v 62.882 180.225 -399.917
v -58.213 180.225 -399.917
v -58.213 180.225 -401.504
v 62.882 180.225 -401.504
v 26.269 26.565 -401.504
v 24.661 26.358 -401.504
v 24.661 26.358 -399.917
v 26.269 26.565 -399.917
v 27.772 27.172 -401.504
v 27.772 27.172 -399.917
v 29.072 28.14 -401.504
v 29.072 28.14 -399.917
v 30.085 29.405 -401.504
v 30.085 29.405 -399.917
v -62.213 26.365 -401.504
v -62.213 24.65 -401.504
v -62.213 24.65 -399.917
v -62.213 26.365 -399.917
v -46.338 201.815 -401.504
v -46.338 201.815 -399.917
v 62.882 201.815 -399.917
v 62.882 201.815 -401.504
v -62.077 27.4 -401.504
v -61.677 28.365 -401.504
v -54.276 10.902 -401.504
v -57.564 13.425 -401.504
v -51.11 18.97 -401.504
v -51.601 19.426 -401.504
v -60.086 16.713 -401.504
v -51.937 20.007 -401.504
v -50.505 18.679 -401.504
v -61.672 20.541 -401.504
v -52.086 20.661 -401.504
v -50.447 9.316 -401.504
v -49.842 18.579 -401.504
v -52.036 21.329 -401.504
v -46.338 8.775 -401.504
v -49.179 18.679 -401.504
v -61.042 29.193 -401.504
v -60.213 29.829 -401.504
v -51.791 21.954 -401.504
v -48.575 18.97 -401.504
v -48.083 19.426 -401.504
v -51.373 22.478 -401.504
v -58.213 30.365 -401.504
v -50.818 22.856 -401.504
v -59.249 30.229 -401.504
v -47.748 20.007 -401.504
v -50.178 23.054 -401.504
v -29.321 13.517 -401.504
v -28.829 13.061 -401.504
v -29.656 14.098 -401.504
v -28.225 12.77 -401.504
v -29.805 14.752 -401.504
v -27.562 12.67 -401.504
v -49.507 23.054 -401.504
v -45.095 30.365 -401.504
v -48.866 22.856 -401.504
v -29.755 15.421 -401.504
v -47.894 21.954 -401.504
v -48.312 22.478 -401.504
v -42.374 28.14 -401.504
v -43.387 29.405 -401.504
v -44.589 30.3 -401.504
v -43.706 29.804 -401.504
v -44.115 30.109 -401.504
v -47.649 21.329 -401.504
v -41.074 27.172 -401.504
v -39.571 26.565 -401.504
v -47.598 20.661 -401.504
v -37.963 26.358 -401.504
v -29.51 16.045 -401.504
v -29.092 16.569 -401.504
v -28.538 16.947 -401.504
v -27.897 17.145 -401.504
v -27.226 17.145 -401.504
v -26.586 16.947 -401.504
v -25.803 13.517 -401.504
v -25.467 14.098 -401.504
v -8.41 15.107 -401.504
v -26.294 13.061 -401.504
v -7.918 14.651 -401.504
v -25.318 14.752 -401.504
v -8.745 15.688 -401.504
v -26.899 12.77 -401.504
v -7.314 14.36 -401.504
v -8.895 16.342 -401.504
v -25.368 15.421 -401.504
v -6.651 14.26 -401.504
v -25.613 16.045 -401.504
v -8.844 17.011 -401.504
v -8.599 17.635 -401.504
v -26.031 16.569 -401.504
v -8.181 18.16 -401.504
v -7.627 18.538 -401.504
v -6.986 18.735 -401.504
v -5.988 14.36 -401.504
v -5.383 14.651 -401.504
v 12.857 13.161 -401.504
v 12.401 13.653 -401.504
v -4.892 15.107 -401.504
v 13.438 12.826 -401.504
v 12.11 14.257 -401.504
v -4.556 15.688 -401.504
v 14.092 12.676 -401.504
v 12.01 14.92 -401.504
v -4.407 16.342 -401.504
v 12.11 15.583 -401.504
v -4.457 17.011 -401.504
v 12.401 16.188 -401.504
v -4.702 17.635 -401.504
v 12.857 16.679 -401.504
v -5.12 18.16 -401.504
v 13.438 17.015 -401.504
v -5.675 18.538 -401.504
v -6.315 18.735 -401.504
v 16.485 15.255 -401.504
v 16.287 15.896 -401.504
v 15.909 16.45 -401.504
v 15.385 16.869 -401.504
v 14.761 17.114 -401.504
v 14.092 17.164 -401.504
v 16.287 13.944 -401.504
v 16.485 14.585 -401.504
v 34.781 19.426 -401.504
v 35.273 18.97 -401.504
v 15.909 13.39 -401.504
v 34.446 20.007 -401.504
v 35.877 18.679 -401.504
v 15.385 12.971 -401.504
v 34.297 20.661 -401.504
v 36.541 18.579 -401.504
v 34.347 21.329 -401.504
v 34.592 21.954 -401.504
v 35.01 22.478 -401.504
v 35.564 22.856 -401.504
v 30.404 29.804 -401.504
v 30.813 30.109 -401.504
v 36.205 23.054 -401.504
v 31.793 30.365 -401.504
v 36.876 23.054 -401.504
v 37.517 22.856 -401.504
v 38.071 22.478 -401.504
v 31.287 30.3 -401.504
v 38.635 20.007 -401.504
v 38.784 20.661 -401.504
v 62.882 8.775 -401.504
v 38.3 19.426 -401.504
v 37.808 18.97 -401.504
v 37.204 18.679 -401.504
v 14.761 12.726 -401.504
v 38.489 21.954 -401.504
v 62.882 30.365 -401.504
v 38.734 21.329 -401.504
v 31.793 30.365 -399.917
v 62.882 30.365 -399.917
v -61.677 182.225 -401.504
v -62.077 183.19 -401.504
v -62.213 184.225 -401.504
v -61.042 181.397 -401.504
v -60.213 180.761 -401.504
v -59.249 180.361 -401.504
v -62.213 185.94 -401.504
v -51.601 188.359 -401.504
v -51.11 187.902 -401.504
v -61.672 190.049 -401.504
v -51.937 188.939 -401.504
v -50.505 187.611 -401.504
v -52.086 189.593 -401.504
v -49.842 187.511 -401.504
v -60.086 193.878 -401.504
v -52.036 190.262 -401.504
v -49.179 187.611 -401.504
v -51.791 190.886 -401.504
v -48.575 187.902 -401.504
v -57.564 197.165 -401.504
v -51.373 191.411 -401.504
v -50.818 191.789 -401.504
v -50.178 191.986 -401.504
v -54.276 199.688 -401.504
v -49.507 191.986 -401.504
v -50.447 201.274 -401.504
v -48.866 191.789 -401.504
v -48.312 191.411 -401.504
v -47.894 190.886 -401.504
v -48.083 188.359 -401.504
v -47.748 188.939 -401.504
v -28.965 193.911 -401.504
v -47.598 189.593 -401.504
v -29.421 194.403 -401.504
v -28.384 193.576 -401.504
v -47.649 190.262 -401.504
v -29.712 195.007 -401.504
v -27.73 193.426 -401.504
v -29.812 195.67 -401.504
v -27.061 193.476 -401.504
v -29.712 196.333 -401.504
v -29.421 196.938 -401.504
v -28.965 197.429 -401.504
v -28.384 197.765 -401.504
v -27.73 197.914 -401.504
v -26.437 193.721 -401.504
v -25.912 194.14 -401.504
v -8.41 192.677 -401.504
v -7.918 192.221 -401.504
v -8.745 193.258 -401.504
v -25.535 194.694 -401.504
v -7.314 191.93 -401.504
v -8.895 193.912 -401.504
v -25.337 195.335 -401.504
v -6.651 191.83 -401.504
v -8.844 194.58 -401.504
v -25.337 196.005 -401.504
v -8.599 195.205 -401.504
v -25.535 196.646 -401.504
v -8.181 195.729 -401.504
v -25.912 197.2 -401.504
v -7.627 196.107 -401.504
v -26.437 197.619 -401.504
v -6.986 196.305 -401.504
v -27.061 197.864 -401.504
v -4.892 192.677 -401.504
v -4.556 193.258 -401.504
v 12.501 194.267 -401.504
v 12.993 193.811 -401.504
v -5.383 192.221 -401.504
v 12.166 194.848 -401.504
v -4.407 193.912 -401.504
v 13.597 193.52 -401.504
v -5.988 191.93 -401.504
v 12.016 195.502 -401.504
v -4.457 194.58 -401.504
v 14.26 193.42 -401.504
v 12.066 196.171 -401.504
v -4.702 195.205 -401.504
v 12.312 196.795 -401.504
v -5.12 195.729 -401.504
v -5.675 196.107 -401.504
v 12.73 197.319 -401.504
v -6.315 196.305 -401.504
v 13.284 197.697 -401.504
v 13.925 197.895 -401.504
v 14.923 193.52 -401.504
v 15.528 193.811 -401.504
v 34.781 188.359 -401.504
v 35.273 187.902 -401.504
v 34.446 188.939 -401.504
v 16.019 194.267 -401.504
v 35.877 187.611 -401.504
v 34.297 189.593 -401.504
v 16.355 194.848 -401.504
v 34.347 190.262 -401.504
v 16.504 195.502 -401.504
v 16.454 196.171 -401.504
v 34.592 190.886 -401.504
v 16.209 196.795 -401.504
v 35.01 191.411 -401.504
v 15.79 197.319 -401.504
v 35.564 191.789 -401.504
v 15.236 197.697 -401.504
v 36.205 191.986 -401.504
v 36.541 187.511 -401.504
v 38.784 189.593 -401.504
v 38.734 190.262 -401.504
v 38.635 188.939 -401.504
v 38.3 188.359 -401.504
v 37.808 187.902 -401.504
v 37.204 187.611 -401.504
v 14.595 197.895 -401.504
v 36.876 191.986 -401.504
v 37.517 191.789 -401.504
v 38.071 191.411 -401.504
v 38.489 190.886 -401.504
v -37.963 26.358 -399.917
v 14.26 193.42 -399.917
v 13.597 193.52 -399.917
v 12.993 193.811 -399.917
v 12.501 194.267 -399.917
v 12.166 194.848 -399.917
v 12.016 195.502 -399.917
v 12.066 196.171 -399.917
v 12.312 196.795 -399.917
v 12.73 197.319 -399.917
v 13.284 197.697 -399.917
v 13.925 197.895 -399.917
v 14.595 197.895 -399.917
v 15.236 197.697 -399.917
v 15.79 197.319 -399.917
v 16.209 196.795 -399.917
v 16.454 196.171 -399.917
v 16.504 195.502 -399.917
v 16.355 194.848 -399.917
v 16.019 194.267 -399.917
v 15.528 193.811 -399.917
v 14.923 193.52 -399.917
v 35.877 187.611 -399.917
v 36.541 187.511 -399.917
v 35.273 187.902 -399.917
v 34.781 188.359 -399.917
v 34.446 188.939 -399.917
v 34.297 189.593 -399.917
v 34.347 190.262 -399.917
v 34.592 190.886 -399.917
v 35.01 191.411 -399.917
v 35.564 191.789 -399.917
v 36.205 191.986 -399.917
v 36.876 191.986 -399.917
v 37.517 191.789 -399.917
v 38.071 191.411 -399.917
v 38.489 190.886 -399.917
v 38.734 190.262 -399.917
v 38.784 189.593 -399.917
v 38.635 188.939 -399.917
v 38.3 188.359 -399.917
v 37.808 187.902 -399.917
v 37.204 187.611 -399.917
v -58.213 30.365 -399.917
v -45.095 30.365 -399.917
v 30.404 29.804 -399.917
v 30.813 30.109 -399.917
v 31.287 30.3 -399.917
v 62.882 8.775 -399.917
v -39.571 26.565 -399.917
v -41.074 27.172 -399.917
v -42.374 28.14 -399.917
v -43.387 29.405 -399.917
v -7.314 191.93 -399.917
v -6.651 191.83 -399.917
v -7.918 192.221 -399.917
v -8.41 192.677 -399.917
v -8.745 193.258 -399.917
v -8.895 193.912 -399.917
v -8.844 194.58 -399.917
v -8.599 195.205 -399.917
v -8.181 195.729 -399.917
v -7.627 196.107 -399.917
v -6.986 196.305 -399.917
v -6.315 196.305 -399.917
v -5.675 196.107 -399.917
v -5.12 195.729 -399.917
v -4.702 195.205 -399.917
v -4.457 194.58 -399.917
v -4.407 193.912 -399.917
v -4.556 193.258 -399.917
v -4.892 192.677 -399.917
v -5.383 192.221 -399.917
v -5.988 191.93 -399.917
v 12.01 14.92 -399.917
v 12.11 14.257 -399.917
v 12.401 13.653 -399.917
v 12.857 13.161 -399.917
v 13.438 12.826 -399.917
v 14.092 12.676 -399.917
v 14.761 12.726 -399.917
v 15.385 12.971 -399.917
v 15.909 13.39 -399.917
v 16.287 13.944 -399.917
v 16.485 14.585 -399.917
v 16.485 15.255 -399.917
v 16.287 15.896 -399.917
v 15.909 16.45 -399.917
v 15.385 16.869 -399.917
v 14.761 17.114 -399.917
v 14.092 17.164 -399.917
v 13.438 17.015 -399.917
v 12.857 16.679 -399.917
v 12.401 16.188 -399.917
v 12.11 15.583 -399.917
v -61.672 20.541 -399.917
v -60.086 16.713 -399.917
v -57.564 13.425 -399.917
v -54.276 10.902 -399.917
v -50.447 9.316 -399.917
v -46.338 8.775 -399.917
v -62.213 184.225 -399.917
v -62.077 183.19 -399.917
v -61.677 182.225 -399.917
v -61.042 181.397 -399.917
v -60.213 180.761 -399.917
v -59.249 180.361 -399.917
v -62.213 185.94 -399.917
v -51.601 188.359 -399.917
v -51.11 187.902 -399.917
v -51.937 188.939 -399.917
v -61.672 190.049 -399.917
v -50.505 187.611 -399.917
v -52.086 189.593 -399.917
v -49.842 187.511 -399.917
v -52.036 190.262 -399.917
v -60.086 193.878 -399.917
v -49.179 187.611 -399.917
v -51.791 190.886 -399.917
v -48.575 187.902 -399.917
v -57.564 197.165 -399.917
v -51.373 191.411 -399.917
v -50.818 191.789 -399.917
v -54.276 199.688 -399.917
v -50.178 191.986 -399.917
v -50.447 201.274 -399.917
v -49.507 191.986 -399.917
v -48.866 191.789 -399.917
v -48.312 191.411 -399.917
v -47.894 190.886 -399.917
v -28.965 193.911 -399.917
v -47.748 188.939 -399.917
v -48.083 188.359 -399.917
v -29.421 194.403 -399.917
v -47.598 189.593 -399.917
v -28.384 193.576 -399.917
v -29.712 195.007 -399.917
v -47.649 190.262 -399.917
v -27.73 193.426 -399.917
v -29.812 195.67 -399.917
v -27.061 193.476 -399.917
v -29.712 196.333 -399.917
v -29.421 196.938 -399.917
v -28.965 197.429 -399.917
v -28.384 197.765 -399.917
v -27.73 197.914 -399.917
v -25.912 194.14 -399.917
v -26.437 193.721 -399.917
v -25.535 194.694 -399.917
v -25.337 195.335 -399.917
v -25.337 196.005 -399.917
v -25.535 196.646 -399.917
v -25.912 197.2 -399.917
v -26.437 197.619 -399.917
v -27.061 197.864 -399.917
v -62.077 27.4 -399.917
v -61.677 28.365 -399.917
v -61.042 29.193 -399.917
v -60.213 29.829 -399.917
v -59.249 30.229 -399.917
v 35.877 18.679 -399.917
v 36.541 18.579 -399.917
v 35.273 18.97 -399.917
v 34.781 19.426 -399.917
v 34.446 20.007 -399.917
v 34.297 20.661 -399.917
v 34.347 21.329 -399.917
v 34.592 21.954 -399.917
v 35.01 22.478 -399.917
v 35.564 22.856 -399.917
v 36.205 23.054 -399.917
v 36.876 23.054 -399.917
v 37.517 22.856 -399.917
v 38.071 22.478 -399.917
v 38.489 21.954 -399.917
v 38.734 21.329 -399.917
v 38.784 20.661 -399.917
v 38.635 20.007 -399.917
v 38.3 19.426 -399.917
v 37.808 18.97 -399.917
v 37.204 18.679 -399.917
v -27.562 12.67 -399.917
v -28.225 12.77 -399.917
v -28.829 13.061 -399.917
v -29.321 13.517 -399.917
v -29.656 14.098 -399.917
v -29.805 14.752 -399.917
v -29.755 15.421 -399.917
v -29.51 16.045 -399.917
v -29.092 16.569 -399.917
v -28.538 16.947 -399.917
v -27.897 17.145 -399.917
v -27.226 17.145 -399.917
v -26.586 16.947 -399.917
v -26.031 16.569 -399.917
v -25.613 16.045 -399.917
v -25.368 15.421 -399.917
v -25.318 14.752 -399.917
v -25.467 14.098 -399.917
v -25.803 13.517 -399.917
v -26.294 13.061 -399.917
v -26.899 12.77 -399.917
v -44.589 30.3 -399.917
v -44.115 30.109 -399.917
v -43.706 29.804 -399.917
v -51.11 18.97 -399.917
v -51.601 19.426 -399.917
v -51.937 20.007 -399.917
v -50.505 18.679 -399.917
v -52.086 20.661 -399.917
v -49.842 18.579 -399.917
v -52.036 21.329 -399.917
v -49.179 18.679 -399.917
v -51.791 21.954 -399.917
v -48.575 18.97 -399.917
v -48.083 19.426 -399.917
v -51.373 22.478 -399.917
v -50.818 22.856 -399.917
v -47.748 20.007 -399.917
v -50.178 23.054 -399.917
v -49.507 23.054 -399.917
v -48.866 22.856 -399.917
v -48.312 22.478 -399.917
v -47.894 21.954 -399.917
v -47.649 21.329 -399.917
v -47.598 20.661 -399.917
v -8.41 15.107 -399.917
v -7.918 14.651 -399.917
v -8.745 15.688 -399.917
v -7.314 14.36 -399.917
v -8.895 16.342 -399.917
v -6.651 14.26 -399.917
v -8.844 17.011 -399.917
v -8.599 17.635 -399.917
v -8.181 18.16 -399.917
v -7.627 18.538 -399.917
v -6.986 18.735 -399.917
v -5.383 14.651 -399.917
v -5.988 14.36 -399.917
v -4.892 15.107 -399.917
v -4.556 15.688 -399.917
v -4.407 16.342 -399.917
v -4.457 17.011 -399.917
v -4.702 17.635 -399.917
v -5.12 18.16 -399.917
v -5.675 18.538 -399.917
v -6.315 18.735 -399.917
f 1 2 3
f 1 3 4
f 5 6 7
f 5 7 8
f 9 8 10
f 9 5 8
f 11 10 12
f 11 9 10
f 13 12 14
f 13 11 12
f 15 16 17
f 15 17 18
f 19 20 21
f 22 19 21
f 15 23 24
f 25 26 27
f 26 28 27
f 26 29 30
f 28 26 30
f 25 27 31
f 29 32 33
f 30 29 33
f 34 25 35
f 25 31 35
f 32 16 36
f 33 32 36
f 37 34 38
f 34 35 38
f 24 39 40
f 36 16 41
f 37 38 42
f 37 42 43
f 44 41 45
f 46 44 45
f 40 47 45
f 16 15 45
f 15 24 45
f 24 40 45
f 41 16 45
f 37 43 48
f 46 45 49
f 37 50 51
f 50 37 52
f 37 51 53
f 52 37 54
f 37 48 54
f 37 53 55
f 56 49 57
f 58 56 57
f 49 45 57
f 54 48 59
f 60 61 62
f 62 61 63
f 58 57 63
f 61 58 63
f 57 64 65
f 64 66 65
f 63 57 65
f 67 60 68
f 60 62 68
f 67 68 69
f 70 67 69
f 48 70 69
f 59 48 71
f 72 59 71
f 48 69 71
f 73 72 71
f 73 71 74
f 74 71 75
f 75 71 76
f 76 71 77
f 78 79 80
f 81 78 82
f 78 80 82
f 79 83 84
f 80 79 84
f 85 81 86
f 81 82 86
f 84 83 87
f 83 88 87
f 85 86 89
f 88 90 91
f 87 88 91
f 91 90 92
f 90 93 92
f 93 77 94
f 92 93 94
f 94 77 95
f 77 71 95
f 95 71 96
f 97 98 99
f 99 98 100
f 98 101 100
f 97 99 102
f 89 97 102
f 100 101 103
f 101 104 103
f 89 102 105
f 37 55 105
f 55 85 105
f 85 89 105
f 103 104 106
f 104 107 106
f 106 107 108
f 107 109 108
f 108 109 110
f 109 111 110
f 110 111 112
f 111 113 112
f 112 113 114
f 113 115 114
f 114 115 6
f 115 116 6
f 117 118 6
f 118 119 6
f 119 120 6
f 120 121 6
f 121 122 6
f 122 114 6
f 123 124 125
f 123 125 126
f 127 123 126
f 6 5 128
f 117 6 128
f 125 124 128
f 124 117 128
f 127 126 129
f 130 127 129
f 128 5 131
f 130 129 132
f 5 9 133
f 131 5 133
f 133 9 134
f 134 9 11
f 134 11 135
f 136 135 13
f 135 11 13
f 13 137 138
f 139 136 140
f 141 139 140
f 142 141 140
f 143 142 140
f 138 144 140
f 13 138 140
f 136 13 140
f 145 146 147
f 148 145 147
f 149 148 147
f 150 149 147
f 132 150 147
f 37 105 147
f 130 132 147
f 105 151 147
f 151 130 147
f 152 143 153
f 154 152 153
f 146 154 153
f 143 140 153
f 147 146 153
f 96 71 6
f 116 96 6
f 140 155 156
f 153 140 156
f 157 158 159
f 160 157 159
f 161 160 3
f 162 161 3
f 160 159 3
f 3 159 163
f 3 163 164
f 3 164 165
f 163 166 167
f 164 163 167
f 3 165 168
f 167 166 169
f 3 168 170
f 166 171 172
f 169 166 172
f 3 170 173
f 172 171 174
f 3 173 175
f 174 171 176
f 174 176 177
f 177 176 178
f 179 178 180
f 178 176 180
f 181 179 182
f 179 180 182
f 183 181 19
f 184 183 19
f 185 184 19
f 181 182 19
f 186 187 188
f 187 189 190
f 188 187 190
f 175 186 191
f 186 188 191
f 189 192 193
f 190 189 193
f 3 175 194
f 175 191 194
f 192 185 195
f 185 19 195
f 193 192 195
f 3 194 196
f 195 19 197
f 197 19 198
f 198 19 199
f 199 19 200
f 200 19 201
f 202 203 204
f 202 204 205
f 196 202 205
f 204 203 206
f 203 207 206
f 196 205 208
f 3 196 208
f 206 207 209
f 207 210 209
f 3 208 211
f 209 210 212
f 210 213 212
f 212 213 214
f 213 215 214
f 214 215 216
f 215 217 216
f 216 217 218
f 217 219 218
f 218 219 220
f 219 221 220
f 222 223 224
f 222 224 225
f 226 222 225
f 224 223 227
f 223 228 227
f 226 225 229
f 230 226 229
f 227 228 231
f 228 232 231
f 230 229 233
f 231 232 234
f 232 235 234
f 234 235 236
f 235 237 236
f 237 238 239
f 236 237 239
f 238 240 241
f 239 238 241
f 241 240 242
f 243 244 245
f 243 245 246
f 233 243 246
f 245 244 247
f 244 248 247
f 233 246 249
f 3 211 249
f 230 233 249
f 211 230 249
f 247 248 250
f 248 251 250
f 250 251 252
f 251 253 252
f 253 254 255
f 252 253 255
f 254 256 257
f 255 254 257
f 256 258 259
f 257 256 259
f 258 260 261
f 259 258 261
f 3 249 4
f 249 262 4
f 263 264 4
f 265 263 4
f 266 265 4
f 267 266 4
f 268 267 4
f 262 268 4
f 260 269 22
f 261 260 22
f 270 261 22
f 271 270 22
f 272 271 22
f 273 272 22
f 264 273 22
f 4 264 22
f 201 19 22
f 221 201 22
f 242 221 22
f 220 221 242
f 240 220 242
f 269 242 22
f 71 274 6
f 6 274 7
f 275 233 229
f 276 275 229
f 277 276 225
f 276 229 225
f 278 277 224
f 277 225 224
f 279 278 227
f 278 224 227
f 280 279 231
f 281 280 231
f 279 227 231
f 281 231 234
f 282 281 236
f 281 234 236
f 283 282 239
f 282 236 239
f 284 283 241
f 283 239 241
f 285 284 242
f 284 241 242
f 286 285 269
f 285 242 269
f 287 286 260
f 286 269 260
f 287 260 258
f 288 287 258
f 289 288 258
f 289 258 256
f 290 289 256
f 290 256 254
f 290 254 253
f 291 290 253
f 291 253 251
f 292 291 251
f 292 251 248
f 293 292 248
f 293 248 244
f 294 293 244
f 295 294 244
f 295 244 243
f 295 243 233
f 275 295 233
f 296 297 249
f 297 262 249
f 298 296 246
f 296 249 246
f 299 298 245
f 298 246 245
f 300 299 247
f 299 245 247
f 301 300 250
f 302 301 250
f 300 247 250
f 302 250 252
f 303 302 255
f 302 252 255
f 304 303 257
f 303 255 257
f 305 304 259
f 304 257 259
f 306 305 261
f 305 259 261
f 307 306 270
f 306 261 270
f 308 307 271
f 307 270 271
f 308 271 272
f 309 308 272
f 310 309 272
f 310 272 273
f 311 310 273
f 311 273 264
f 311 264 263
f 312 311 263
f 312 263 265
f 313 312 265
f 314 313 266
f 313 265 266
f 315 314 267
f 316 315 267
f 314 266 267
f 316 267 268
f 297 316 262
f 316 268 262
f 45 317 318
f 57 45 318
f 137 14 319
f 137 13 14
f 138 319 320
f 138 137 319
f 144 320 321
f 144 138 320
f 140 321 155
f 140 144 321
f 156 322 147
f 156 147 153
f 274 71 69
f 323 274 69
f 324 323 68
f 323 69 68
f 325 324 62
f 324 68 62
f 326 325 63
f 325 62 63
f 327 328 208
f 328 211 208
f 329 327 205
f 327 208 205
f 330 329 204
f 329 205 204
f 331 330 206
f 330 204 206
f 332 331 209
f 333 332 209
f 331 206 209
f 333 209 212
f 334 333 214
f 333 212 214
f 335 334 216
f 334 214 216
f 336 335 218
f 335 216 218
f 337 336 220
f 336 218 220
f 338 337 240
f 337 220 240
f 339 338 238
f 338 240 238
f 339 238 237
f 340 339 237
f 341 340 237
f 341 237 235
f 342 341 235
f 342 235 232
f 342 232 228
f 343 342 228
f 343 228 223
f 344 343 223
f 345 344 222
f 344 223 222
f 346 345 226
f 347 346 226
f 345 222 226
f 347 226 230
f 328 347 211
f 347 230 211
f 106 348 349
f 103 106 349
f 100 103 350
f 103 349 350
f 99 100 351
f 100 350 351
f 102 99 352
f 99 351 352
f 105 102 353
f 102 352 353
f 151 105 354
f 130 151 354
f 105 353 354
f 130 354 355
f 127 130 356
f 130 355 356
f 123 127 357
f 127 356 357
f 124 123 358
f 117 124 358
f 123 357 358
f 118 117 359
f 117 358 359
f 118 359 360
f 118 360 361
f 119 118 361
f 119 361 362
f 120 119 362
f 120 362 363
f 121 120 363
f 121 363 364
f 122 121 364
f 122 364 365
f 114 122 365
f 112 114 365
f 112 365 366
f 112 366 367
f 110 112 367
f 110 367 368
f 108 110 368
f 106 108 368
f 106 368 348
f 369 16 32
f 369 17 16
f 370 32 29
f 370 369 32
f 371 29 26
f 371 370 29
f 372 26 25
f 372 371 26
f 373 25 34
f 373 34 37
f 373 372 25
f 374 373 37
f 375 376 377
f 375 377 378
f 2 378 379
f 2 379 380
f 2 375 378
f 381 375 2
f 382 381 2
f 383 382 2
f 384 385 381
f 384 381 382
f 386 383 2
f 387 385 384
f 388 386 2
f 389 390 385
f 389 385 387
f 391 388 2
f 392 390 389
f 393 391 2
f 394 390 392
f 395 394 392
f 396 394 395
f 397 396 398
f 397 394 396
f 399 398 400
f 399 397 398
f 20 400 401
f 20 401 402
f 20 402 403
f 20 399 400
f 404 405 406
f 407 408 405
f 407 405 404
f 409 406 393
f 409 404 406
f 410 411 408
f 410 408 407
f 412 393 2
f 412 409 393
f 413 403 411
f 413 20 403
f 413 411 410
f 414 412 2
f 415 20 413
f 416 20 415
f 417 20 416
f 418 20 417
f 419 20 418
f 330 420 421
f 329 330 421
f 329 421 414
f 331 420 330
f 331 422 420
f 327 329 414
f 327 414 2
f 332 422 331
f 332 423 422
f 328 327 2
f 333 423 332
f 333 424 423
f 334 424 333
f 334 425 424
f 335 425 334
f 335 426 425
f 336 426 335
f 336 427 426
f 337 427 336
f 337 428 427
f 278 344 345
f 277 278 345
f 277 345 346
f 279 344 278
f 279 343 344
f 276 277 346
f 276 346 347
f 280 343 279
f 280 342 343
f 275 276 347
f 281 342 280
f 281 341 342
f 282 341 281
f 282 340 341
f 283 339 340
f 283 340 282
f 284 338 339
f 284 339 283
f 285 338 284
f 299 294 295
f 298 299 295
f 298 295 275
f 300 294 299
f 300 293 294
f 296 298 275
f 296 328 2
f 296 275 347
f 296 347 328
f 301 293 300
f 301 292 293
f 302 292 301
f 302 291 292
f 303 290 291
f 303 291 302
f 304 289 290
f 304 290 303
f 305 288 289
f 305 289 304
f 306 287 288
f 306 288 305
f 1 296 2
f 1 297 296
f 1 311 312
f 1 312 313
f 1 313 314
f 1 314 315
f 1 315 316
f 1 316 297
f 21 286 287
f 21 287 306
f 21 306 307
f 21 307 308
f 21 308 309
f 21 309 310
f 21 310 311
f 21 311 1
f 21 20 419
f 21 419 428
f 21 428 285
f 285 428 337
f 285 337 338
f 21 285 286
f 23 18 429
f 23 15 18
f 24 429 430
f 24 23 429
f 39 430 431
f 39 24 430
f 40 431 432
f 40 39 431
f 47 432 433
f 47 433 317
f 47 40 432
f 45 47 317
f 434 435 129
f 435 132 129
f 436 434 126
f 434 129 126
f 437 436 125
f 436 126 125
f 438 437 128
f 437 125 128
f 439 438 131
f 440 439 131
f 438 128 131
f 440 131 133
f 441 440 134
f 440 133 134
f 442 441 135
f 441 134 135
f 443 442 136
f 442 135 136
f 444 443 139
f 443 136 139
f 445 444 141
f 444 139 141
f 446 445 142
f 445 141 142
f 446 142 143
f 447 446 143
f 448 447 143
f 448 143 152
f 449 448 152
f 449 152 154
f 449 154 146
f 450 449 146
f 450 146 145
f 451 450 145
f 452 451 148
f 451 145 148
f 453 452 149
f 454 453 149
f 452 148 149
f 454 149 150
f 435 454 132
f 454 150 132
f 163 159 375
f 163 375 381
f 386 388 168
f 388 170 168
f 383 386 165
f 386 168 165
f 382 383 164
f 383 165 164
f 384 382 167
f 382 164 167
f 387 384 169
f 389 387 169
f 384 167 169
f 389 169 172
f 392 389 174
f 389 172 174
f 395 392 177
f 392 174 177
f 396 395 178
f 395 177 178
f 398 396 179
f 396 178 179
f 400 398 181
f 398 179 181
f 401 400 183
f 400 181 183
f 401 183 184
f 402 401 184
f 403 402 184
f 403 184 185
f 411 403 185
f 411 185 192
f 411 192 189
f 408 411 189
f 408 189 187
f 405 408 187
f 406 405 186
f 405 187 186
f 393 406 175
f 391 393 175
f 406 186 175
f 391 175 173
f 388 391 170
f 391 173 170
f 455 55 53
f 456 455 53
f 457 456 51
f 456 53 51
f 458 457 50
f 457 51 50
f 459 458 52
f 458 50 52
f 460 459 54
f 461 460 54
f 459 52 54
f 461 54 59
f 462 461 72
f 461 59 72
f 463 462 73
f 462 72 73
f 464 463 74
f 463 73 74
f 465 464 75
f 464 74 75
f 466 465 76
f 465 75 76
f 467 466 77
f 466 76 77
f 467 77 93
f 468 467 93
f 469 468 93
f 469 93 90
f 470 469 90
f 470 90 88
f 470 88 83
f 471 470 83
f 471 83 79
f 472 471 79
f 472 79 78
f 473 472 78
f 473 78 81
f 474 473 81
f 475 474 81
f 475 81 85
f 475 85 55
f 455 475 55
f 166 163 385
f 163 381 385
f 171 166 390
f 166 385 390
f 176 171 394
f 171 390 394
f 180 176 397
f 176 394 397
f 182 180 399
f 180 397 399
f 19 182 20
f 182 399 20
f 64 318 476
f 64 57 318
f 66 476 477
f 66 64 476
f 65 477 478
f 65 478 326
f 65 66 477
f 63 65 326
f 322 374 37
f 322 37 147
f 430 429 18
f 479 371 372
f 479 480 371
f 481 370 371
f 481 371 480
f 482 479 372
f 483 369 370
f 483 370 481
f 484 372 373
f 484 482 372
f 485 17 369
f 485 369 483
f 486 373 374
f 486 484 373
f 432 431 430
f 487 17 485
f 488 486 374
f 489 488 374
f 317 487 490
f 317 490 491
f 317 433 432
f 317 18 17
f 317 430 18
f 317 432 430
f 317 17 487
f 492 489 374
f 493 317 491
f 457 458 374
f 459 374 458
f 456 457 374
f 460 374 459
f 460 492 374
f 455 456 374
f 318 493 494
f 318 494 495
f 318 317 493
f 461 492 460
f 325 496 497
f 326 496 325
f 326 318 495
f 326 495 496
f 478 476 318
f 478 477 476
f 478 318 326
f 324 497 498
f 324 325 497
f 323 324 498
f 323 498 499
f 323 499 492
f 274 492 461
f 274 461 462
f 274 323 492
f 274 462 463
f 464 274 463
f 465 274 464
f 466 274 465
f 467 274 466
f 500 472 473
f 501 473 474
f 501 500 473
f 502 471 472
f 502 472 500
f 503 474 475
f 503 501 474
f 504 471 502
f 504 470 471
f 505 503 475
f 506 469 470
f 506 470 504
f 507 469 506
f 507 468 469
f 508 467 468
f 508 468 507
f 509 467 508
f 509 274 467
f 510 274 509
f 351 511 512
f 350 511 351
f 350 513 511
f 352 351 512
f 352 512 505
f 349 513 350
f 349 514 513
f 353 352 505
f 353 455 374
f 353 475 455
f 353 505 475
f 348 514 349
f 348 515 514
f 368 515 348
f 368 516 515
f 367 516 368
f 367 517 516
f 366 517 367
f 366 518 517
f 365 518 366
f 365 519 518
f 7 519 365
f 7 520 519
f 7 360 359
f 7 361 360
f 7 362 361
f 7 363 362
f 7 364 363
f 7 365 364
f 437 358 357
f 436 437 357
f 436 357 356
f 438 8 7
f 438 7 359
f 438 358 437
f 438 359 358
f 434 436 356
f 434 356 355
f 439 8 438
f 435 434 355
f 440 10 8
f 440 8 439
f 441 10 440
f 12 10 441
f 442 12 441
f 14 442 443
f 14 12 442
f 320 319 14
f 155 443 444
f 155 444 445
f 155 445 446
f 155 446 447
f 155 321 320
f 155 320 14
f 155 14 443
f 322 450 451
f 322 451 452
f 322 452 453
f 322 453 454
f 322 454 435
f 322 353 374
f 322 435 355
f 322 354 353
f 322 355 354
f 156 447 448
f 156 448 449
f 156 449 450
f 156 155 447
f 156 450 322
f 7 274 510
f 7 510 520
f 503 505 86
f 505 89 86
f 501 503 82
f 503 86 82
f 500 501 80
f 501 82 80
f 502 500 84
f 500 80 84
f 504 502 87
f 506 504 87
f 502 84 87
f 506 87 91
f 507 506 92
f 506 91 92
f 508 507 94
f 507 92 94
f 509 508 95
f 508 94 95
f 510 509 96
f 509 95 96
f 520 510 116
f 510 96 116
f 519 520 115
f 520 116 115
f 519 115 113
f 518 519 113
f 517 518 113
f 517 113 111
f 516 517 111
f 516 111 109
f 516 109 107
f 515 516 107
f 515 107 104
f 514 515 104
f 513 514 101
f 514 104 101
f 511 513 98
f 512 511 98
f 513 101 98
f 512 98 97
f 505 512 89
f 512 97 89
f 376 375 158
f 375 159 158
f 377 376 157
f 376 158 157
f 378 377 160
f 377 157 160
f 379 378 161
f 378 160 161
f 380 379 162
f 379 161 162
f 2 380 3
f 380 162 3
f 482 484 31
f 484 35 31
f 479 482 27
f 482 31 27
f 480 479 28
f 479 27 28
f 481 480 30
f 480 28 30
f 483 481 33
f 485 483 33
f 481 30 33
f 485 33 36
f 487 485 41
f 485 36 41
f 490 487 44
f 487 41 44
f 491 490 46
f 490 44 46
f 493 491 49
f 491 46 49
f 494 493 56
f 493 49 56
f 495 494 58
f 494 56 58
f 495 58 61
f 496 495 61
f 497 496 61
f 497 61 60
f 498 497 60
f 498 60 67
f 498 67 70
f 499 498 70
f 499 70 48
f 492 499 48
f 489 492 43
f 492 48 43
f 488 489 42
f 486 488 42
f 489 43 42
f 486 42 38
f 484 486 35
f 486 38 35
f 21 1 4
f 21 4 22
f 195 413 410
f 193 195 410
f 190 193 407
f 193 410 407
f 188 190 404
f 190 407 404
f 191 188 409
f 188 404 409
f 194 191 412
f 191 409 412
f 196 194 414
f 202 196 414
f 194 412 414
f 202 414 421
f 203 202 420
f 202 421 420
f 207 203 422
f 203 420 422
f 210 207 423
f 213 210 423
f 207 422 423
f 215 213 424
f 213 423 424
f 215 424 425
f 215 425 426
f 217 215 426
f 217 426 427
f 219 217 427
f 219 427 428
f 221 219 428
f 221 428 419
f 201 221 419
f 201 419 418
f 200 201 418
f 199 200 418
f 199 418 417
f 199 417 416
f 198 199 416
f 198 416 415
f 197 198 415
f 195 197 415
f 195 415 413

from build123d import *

# Parameters (mm, degrees)
SKETCH2_W                     = 111.125
SKETCH2_H                     = 193.04
BOSS_EXTRUDE1_DEPTH           = 1.5875
FILLET1_R                     = 15.875
SKETCH6_R                     = 2.4003
SKETCH6_R_2                   = 3
SKETCH6_R_3                   = 6.477
SKETCH6_R_4                   = 10.762
CUT_EXTRUDE1_DEPTH            = 212.192646736
SKETCH7_W                     = 13.97
SKETCH7_H                     = 193.04
BOSS_EXTRUDE2_DEPTH           = 1.5875
SKETCH8_W                     = 75.32443897
SKETCH8_H                     = 38.1
SKETCH8_R                     = 10.762
SKETCH8_R_2                   = 3
SKETCH8_H_2                   = 31.75
SKETCH8_H_3                   = 34.487219484
SKETCH8_R_3                   = 2.4003
SKETCH8_R_4                   = 6.477
SKETCH8_R_5                   = 8.9535
CUT_EXTRUDE2_DEPTH            = 1.5875
FILLET2_R                     = 9.525
FILLET3_R                     = 6.35
FILLET4_R                     = 9.525
SKETCH9_W                     = 125.095
SKETCH9_H                     = 149.86
CUT_EXTRUDE5_DEPTH            = 80
FILLET6_R                     = 4
FILLET8_R                     = 2
FILLET9_R                     = 2
FILLET10_R                    = 4
SKETCH4_W                     = 2.25
SKETCH4_H                     = 1.5875
M4_CLEARANCE_HOLE1_AT_2_COUNT = 2
M4_CLEARANCE_HOLE1_AT_2_PITCH = 43.406709572
M4_CLEARANCE_HOLE1_AT_3_COUNT = 2
M4_CLEARANCE_HOLE1_AT_3_PITCH = 86.3827405
M4_CLEARANCE_HOLE1_AT_4_COUNT = 2
M4_CLEARANCE_HOLE1_AT_4_PITCH = 189.737314909
M4_CLEARANCE_HOLE1_AT_5_COUNT = 2
M4_CLEARANCE_HOLE1_AT_5_PITCH = 178.553711266
M4_CLEARANCE_HOLE1_AT_6_COUNT = 2
M4_CLEARANCE_HOLE1_AT_6_PITCH = 168.9327405
M4_CLEARANCE_HOLE1_AT_7_COUNT = 2
M4_CLEARANCE_HOLE1_AT_7_PITCH = 23.050611575
M4_CLEARANCE_HOLE1_AT_8_COUNT = 2
M4_CLEARANCE_HOLE1_AT_8_PITCH = 186.221930585
SKETCH12_R                    = 2.25
CUT_EXTRUDE6_DEPTH            = 212.39048994


with BuildPart() as part:
    # Sketch2 → Boss-Extrude1 (new body)
    with BuildSketch(Plane.XY.offset(-401.504104662)):
        with Locations((-6.650833159, 105.295051609)):
            Rectangle(SKETCH2_W, SKETCH2_H)
        with BuildLine():
            ThreePointArc((40.429624387, 185.872334563), (40.429624387, 193.650509156), (32.651449794, 193.650509156))
            Line((32.651449794, 193.650509156), (29.670992248, 190.670051609))
            Line((29.670992248, 190.670051609), (-1.150833159, 190.670051609))
            Line((-1.150833159, 190.670051609), (-1.150833159, 194.079751609))
            ThreePointArc((-1.150833159, 194.079751609), (-6.650833159, 199.579751609), (-12.150833159, 194.079751609))
            Line((-12.150833159, 194.079751609), (-12.150833159, 190.670051609))
            Line((-12.150833159, 190.670051609), (-42.972658566, 190.670051609))
            Line((-42.972658566, 190.670051609), (-45.953116112, 193.650509156))
            ThreePointArc((-45.953116112, 193.650509156), (-53.731290705, 193.650509156), (-53.731290705, 185.872334563))
            Line((-53.731290705, 185.872334563), (-50.750833159, 182.891877016))
            Line((-50.750833159, 182.891877016), (-50.750833159, 138.989051609))
            Line((-50.750833159, 138.989051609), (-54.160533159, 138.989051609))
            ThreePointArc((-54.160533159, 138.989051609), (-59.660533159, 133.489051609), (-54.160533159, 127.989051609))
            Line((-54.160533159, 127.989051609), (-50.750833159, 127.989051609))
            Line((-50.750833159, 127.989051609), (-50.750833159, 82.601051609))
            Line((-50.750833159, 82.601051609), (-54.160533159, 82.601051609))
            ThreePointArc((-54.160533159, 82.601051609), (-59.660533159, 77.101051609), (-54.160533159, 71.601051609))
            Line((-54.160533159, 71.601051609), (-50.750833159, 71.601051609))
            Line((-50.750833159, 71.601051609), (-50.750833159, 27.698226203))
            Line((-50.750833159, 27.698226203), (-53.731290705, 24.717768656))
            ThreePointArc((-53.731290705, 24.717768656), (-53.731290705, 16.939594063), (-45.953116112, 16.939594063))
            Line((-45.953116112, 16.939594063), (-42.972658566, 19.920051609))
            Line((-42.972658566, 19.920051609), (-12.150833159, 19.920051609))
            Line((-12.150833159, 19.920051609), (-12.150833159, 16.510351609))
            ThreePointArc((-12.150833159, 16.510351609), (-6.650833159, 11.010351609), (-1.150833159, 16.510351609))
            Line((-1.150833159, 16.510351609), (-1.150833159, 19.920051609))
            Line((-1.150833159, 19.920051609), (29.670992248, 19.920051609))
            Line((29.670992248, 19.920051609), (32.651449794, 16.939594063))
            ThreePointArc((32.651449794, 16.939594063), (40.429624387, 16.939594063), (40.429624387, 24.717768656))
            Line((40.429624387, 24.717768656), (37.449166841, 27.698226203))
            Line((37.449166841, 27.698226203), (37.449166841, 71.601051609))
            Line((37.449166841, 71.601051609), (40.858866841, 71.601051609))
            ThreePointArc((40.858866841, 71.601051609), (46.358866841, 77.101051609), (40.858866841, 82.601051609))
            Line((40.858866841, 82.601051609), (37.449166841, 82.601051609))
            Line((37.449166841, 82.601051609), (37.449166841, 127.989051609))
            Line((37.449166841, 127.989051609), (40.858866841, 127.989051609))
            ThreePointArc((40.858866841, 127.989051609), (46.358866841, 133.489051609), (40.858866841, 138.989051609))
            Line((40.858866841, 138.989051609), (37.449166841, 138.989051609))
            Line((37.449166841, 138.989051609), (37.449166841, 182.891877016))
            Line((37.449166841, 182.891877016), (40.429624387, 185.872334563))
        make_face(mode=Mode.SUBTRACT)
        with BuildLine():
            Line((37.449166841, 182.891877016), (40.429624387, 185.872334563))
            ThreePointArc((40.429624387, 185.872334563), (40.429624387, 193.650509156), (32.651449794, 193.650509156))
            Line((32.651449794, 193.650509156), (29.670992248, 190.670051609))
            Line((29.670992248, 190.670051609), (-1.150833159, 190.670051609))
            Line((-1.150833159, 190.670051609), (-1.150833159, 194.079751609))
            ThreePointArc((-1.150833159, 194.079751609), (-6.650833159, 199.579751609), (-12.150833159, 194.079751609))
            Line((-12.150833159, 194.079751609), (-12.150833159, 190.670051609))
            Line((-12.150833159, 190.670051609), (-42.972658566, 190.670051609))
            Line((-42.972658566, 190.670051609), (-45.953116112, 193.650509156))
            ThreePointArc((-45.953116112, 193.650509156), (-53.731290705, 193.650509156), (-53.731290705, 185.872334563))
            Line((-53.731290705, 185.872334563), (-50.750833159, 182.891877016))
            Line((-50.750833159, 182.891877016), (-50.750833159, 138.989051609))
            Line((-50.750833159, 138.989051609), (-54.160533159, 138.989051609))
            ThreePointArc((-54.160533159, 138.989051609), (-59.660533159, 133.489051609), (-54.160533159, 127.989051609))
            Line((-54.160533159, 127.989051609), (-50.750833159, 127.989051609))
            Line((-50.750833159, 127.989051609), (-50.750833159, 82.601051609))
            Line((-50.750833159, 82.601051609), (-54.160533159, 82.601051609))
            ThreePointArc((-54.160533159, 82.601051609), (-59.660533159, 77.101051609), (-54.160533159, 71.601051609))
            Line((-54.160533159, 71.601051609), (-50.750833159, 71.601051609))
            Line((-50.750833159, 71.601051609), (-50.750833159, 27.698226203))
            Line((-50.750833159, 27.698226203), (-53.731290705, 24.717768656))
            ThreePointArc((-53.731290705, 24.717768656), (-53.731290705, 16.939594063), (-45.953116112, 16.939594063))
            Line((-45.953116112, 16.939594063), (-42.972658566, 19.920051609))
            Line((-42.972658566, 19.920051609), (-12.150833159, 19.920051609))
            Line((-12.150833159, 19.920051609), (-12.150833159, 16.510351609))
            ThreePointArc((-12.150833159, 16.510351609), (-6.650833159, 11.010351609), (-1.150833159, 16.510351609))
            Line((-1.150833159, 16.510351609), (-1.150833159, 19.920051609))
            Line((-1.150833159, 19.920051609), (29.670992248, 19.920051609))
            Line((29.670992248, 19.920051609), (32.651449794, 16.939594063))
            ThreePointArc((32.651449794, 16.939594063), (40.429624387, 16.939594063), (40.429624387, 24.717768656))
            Line((40.429624387, 24.717768656), (37.449166841, 27.698226203))
            Line((37.449166841, 27.698226203), (37.449166841, 71.601051609))
            Line((37.449166841, 71.601051609), (40.858866841, 71.601051609))
            ThreePointArc((40.858866841, 71.601051609), (46.358866841, 77.101051609), (40.858866841, 82.601051609))
            Line((40.858866841, 82.601051609), (37.449166841, 82.601051609))
            Line((37.449166841, 82.601051609), (37.449166841, 127.989051609))
            Line((37.449166841, 127.989051609), (40.858866841, 127.989051609))
            ThreePointArc((40.858866841, 127.989051609), (46.358866841, 133.489051609), (40.858866841, 138.989051609))
            Line((40.858866841, 138.989051609), (37.449166841, 138.989051609))
            Line((37.449166841, 138.989051609), (37.449166841, 182.891877016))
        make_face()
    extrude(amount=BOSS_EXTRUDE1_DEPTH)

    # Fillet1
    fillet1_edges = [part.edges().sort_by_distance(p)[0] for p in [
        (-62.213333159, 201.815051609, -400.710354662),
        (-62.213333159, 8.775051609, -400.710354662),
    ]]
    fillet(fillet1_edges, radius=FILLET1_R)

    # Sketch6 → Cut-Extrude1 (cut, through all)
    with BuildSketch(Plane.XY.offset(-399.916604662)):
        with Locations((-34.590833159, 43.382551609)):
            Circle(SKETCH6_R)
        with Locations((21.289166841, 43.382551609)):
            Circle(SKETCH6_R)
        with Locations((-20.884724927, 142.590766631)):
            Circle(SKETCH6_R_2)
        with Locations((7.583058609, 166.225175879)):
            Circle(SKETCH6_R_2)
        with Locations((3.509166841, 43.382551609)):
            Circle(SKETCH6_R_3)
        with Locations((-16.810833159, 43.382551609)):
            Circle(SKETCH6_R_3)
        with Locations((-33.320833159, 123.670051609)):
            Circle(SKETCH6_R_3)
        with Locations((-6.650833159, 154.407971255)):
            Circle(SKETCH6_R_4)
        with Locations((-6.650833159, 94.607131964)):
            Circle(SKETCH6_R_4)
    extrude(amount=-CUT_EXTRUDE1_DEPTH, mode=Mode.SUBTRACT)

    # Sketch7 → Boss-Extrude2 (add)
    with BuildSketch(Plane.XY.offset(-399.916604662)):
        with Locations((55.896666841, 105.295051609)):
            Rectangle(SKETCH7_W, SKETCH7_H)
    extrude(amount=-BOSS_EXTRUDE2_DEPTH)

    # Sketch8 → Cut-Extrude2 (cut)
    with BuildSketch(Plane.XY.offset(-399.916604662)):
        with Locations((-6.650833159, 154.407971255)):
            Rectangle(SKETCH8_W, SKETCH8_H)
        with Locations((-6.650833159, 154.407971255)):
            Circle(SKETCH8_R, mode=Mode.SUBTRACT)
        with Locations((7.583058609, 166.225175879)):
            Circle(SKETCH8_R_2, mode=Mode.SUBTRACT)
        with Locations((-20.884724927, 142.590766631)):
            Circle(SKETCH8_R_2, mode=Mode.SUBTRACT)
        with Locations((-6.650833159, 94.607131964)):
            Rectangle(SKETCH8_W, SKETCH8_H_2)
        with Locations((-6.650833159, 94.607131964)):
            Circle(SKETCH8_R, mode=Mode.SUBTRACT)
        with Locations((-6.650833159, 43.601441867)):
            Rectangle(SKETCH8_W, SKETCH8_H_3)
        with Locations((-34.590833159, 43.382551609)):
            Circle(SKETCH8_R_3, mode=Mode.SUBTRACT)
        with Locations((-16.810833159, 43.382551609)):
            Circle(SKETCH8_R_4, mode=Mode.SUBTRACT)
        with Locations((3.509166841, 43.382551609)):
            Circle(SKETCH8_R_4, mode=Mode.SUBTRACT)
        with Locations((21.289166841, 43.382551609)):
            Circle(SKETCH8_R_3, mode=Mode.SUBTRACT)
        with Locations((-33.320833159, 123.670051609)):
            Circle(SKETCH8_R_5)
        with Locations((-33.320833159, 123.670051609)):
            Circle(SKETCH8_R_4, mode=Mode.SUBTRACT)
    extrude(amount=-CUT_EXTRUDE2_DEPTH, mode=Mode.SUBTRACT)

    # Fillet2
    fillet2_edges = [part.edges().sort_by_distance(p)[0] for p in [
        (31.011386326, 135.357971255, -400.710354662),
        (-44.313052644, 135.357971255, -400.710354662),
        (-44.313052644, 173.457971255, -400.710354662),
        (31.011386326, 173.457971255, -400.710354662),
    ]]
    fillet(fillet2_edges, radius=FILLET2_R)

    # Fillet3
    fillet3_edges = [part.edges().sort_by_distance(p)[0] for p in [
        (-44.313052644, 60.845051609, -400.710354662),
        (31.011386326, 60.845051609, -400.710354662),
        (31.011386326, 26.357832125, -400.710354662),
        (-44.313052644, 26.357832125, -400.710354662),
    ]]
    fillet(fillet3_edges, radius=FILLET3_R)

    # Fillet4
    fillet4_edges = [part.edges().sort_by_distance(p)[0] for p in [
        (31.011386326, 110.482131964, -400.710354662),
        (31.011386326, 78.732131964, -400.710354662),
        (-44.313052644, 78.732131964, -400.710354662),
        (-44.313052644, 110.482131964, -400.710354662),
    ]]
    fillet(fillet4_edges, radius=FILLET4_R)

    # Sketch9 → Cut-Extrude5 (cut)
    with BuildSketch(Plane.XY.offset(-399.916604662)):
        with Locations((0.334166841, 105.295051609)):
            Rectangle(SKETCH9_W, SKETCH9_H)
    extrude(amount=-CUT_EXTRUDE5_DEPTH, mode=Mode.SUBTRACT)


with BuildPart() as cut_extrude5_piece_1:
    # of the separate pieces the step leaves, piece 1, a body of its own (cut_extrude5_pieces)
    add(part.part.solids().sort_by_distance((62.881666841, 201.815051609, -401.504104662))[0])

    # Fillet10
    fillet10_edges = [cut_extrude5_piece_1.edges().sort_by_distance(p)[0] for p in [
        (-62.213333159, 180.225051609, -400.710354662),
    ]]
    fillet(fillet10_edges, radius=FILLET10_R)

    # Sketch4 → M4 Clearance Hole1 (revolve, cut)
    with BuildSketch(Plane(origin=(36.540537091, 189.761421859, -399.916604662), x_dir=(0, -1, 0), z_dir=(1, 0, 0))):
        with Locations((1.125, 0.79375)):
            Rectangle(SKETCH4_W, SKETCH4_H)
    m4_clearance_hole1 = revolve(axis=Axis((36.540537091, 189.761421859, -393.566604662), (0, 0, -1)), mode=Mode.SUBTRACT)

    # M4 Clearance Hole1 at 2: M4 Clearance Hole1 ×2
    with Locations(*[Vector(-0.9950390314183887, 0.09948530521617187, 0) * (i * M4_CLEARANCE_HOLE1_AT_2_PITCH) for i in range(1, M4_CLEARANCE_HOLE1_AT_2_COUNT)]):
        add(m4_clearance_hole1, mode=Mode.SUBTRACT)

    # M4 Clearance Hole1 at 3: M4 Clearance Hole1 ×2
    with Locations(*[(-i * M4_CLEARANCE_HOLE1_AT_3_PITCH, 0, 0) for i in range(1, M4_CLEARANCE_HOLE1_AT_3_COUNT)]):
        add(m4_clearance_hole1, mode=Mode.SUBTRACT)

    # M4 Clearance Hole1 at 7: M4 Clearance Hole1 ×2
    with Locations(*[Vector(-0.9665885641891935, 0.25633288430997997, 0) * (i * M4_CLEARANCE_HOLE1_AT_7_PITCH) for i in range(1, M4_CLEARANCE_HOLE1_AT_7_COUNT)]):
        add(m4_clearance_hole1, mode=Mode.SUBTRACT)


with BuildPart() as cut_extrude5_piece_2:
    # of the separate pieces the step leaves, piece 2, a body of its own (cut_extrude5_pieces)
    add(part.part.solids().sort_by_distance((30.563409662, 30.365051609, -401.504104662))[0])

    # Fillet6
    fillet6_edges = [cut_extrude5_piece_2.edges().sort_by_distance(p)[0] for p in [
        (-62.213333159, 30.365051609, -400.710354662),
    ]]
    fillet(fillet6_edges, radius=FILLET6_R)

    # Fillet8
    fillet8_edges = [cut_extrude5_piece_2.edges().sort_by_distance(p)[0] for p in [
        (-43.86507598, 30.365051609, -400.710354662),
    ]]
    fillet(fillet8_edges, radius=FILLET8_R)

    # Fillet9
    fillet9_edges = [cut_extrude5_piece_2.edges().sort_by_distance(p)[0] for p in [
        (30.563409662, 30.365051609, -400.710354662),
    ]]
    fillet(fillet9_edges, radius=FILLET9_R)

    # M4 Clearance Hole1 at 4: M4 Clearance Hole1 ×2
    with Locations(*[Vector(-0.45527544511186635, -0.890350643891603, 0) * (i * M4_CLEARANCE_HOLE1_AT_4_PITCH) for i in range(1, M4_CLEARANCE_HOLE1_AT_4_COUNT)]):
        add(m4_clearance_hole1, mode=Mode.SUBTRACT)

    # M4 Clearance Hole1 at 5: M4 Clearance Hole1 ×2
    with Locations(*[Vector(-0.24189567354056962, -0.970302263793275, 0) * (i * M4_CLEARANCE_HOLE1_AT_5_PITCH) for i in range(1, M4_CLEARANCE_HOLE1_AT_5_COUNT)]):
        add(m4_clearance_hole1, mode=Mode.SUBTRACT)

    # M4 Clearance Hole1 at 6: M4 Clearance Hole1 ×2
    with Locations(*[(0, -i * M4_CLEARANCE_HOLE1_AT_6_PITCH, 0) for i in range(1, M4_CLEARANCE_HOLE1_AT_6_COUNT)]):
        add(m4_clearance_hole1, mode=Mode.SUBTRACT)

    # M4 Clearance Hole1 at 8: M4 Clearance Hole1 ×2
    with Locations(*[Vector(-0.34422520887864616, -0.9388871101322313, 0) * (i * M4_CLEARANCE_HOLE1_AT_8_PITCH) for i in range(1, M4_CLEARANCE_HOLE1_AT_8_COUNT)]):
        add(m4_clearance_hole1, mode=Mode.SUBTRACT)


with BuildPart() as cut_extrude6_tool:
    # Sketch12 → Cut-Extrude6 (new, through all)
    with BuildSketch(Plane.XY.offset(-399.916604662)):
        with Locations((14.260079544, 195.670051609)):
            Circle(SKETCH12_R)
        with Locations((-27.561745863, 14.920051609)):
            Circle(SKETCH12_R)
        with Locations(Location((14.260079544, 14.920051609, 0), (0, 0, 180))):
            Circle(SKETCH12_R)
        with Locations(Location((-27.561745863, 195.670051609, 0), (0, 0, 180))):
            Circle(SKETCH12_R)
    extrude(amount=-CUT_EXTRUDE6_DEPTH)


with BuildPart() as cut_extrude5_piece_1_1:
    add(cut_extrude5_piece_1.part)

    # Cut-Extrude6: cut by cut_extrude6_tool
    add(cut_extrude6_tool.part, mode=Mode.SUBTRACT)


with BuildPart() as cut_extrude5_piece_2_1:
    add(cut_extrude5_piece_2.part)

    # Cut-Extrude6: cut by cut_extrude6_tool
    add(cut_extrude6_tool.part, mode=Mode.SUBTRACT)


solid = Compound([cut_extrude5_piece_1_1.part, cut_extrude5_piece_2_1.part])
